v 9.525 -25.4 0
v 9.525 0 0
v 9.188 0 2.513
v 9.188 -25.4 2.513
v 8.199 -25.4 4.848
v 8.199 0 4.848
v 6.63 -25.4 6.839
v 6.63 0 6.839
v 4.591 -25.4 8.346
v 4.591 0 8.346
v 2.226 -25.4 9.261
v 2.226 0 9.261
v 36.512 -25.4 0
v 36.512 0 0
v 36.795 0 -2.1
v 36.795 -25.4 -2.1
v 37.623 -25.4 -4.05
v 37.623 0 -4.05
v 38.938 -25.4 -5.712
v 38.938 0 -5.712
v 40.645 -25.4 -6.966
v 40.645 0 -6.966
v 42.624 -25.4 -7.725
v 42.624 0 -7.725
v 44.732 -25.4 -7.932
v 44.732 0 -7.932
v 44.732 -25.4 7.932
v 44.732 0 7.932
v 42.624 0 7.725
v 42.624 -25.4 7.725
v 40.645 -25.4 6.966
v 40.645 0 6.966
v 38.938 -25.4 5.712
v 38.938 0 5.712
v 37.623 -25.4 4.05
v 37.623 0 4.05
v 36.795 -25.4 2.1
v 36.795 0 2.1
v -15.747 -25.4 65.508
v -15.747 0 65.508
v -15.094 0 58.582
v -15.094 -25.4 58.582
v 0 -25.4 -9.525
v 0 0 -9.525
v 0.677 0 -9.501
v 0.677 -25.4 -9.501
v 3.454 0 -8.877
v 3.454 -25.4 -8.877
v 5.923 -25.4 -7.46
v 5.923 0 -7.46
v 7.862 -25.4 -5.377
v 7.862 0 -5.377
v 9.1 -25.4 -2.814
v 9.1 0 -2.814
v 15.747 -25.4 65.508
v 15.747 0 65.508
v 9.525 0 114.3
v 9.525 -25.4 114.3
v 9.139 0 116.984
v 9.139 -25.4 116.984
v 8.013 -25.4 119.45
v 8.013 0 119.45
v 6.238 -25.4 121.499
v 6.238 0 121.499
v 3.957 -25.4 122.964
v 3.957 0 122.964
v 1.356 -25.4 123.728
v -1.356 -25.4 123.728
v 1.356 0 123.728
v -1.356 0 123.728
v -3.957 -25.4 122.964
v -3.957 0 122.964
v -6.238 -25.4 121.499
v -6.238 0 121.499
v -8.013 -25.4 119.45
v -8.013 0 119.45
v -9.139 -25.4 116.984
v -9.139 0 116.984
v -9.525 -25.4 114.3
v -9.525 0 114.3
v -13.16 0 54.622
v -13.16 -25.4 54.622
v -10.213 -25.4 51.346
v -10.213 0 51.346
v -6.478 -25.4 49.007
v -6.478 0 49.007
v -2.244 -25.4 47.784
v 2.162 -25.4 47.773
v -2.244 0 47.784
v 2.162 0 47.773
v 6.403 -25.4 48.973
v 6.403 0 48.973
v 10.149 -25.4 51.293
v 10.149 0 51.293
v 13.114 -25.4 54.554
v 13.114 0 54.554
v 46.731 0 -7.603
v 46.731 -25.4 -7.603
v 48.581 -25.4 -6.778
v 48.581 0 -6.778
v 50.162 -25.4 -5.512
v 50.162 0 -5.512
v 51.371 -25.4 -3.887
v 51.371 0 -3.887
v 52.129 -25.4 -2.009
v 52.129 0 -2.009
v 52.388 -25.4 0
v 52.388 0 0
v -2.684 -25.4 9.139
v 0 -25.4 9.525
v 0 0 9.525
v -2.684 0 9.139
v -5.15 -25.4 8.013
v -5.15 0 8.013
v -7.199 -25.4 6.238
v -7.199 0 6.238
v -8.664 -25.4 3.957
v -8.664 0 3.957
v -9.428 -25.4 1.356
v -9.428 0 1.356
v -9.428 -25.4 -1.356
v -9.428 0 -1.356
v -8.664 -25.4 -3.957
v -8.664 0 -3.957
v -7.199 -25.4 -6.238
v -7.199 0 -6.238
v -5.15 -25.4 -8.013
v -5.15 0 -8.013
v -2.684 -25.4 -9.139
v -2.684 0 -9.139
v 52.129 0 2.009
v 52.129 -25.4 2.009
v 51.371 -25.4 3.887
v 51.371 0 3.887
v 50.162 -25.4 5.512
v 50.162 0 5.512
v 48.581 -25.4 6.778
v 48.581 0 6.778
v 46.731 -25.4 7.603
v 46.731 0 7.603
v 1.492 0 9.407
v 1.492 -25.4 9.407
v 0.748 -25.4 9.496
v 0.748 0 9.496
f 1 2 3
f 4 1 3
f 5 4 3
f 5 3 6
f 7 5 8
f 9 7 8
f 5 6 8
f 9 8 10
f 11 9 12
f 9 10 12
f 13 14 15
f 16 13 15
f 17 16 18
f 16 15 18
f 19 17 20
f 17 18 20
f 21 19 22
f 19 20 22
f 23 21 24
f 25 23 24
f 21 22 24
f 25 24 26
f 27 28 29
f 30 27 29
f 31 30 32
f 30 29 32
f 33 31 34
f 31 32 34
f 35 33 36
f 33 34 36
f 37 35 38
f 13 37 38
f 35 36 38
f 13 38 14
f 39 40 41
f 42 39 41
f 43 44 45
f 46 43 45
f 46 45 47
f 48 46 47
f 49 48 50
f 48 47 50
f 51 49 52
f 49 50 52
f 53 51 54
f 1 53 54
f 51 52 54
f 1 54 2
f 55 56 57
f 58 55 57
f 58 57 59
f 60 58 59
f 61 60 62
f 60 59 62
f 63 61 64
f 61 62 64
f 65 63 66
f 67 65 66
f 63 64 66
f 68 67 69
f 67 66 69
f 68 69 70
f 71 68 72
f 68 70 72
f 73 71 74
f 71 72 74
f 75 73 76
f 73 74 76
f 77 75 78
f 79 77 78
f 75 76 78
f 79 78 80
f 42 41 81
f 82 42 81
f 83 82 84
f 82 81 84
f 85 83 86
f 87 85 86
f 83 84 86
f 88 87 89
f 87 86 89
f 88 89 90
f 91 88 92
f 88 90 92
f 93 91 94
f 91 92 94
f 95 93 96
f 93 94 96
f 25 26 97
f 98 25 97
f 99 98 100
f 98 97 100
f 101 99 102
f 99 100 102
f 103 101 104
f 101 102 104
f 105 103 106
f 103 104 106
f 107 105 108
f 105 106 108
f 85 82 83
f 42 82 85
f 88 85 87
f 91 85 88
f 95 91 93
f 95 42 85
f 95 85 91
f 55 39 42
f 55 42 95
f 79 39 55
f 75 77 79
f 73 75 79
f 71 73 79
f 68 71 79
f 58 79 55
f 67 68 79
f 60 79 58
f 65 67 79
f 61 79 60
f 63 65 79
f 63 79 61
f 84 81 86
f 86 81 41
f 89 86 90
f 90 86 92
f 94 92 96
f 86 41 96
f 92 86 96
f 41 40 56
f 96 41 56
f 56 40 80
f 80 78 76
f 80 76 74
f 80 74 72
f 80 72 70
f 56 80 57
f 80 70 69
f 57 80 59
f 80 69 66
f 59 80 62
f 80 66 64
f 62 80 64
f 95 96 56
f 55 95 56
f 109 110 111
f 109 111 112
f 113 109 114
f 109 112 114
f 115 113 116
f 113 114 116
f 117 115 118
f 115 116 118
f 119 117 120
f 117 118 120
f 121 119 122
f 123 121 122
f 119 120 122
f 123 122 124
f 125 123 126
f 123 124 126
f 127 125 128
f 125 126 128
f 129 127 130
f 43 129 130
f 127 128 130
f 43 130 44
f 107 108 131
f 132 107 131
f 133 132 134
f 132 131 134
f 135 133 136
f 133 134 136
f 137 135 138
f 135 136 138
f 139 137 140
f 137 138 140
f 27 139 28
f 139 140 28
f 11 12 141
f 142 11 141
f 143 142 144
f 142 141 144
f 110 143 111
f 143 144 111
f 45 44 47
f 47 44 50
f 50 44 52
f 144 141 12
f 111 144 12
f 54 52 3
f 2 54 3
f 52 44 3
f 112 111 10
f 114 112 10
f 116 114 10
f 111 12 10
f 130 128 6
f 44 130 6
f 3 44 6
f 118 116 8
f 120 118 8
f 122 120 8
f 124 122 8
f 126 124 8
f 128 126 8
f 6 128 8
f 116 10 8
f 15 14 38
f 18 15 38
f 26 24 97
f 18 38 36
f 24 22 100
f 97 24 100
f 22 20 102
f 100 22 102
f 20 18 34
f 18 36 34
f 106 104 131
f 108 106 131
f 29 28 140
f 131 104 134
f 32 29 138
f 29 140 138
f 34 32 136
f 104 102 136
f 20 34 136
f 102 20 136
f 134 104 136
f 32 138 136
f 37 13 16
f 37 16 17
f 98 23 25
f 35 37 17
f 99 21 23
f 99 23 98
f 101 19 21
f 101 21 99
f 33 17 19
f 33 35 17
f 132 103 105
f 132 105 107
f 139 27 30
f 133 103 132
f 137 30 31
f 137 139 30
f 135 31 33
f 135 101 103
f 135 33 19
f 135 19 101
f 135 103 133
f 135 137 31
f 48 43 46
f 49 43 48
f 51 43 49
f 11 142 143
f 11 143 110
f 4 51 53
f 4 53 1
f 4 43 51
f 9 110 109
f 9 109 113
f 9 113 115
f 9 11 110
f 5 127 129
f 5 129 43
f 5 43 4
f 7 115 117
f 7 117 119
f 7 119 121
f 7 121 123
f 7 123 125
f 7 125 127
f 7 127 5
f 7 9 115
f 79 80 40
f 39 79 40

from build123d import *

# Parameters (mm, degrees)
F1_DEPTH = 25.4


# Not quite as in the source:
# - a feature names something its author has since deleted; it is built from what else it names


with BuildPart() as f1:
    # F0 (on Front) → F1 (new body)
    with BuildSketch(Plane.XZ):
        with BuildLine():
            ThreePointArc((0, 104.775), (6.7351920908, 107.5648079092), (9.525, 114.3))
            ThreePointArc((9.525, 114.3), (0, 123.825), (-9.525, 114.3))
            ThreePointArc((-9.525, 114.3), (-6.7351920908, 107.5648079092), (0, 104.775))
        make_face()
        with BuildLine():
            Line((15.7474569047, 65.5082893304), (9.525, 114.3))
            ThreePointArc((9.525, 114.3), (6.7351920908, 107.5648079092), (0, 104.775))
            Line((0, 104.775), (0, 79.375))
            ThreePointArc((0, 79.375), (10.4912828548, 75.4142187767), (15.7474569047, 65.5082893304))
        make_face()
        with BuildLine():
            ThreePointArc((0, 104.775), (-6.7351920908, 107.5648079092), (-9.525, 114.3))
            Line((-9.525, 114.3), (-15.7474569047, 65.5082893304))
            ThreePointArc((-15.7474569047, 65.5082893304), (-10.4912828548, 75.4142187767), (0, 79.375))
            Line((0, 79.375), (0, 104.775))
        make_face()
        with BuildLine():
            Line((13.1141006333, 54.5537164375), (15.7474569047, 65.5082893304))
            ThreePointArc((15.7474569047, 65.5082893304), (10.4912828548, 75.4142187767), (0, 79.375))
            ThreePointArc((0, 79.375), (-10.4912828548, 75.4142187767), (-15.7474569047, 65.5082893304))
            Line((-15.7474569047, 65.5082893304), (-15.0940259351, 58.5820729906))
            ThreePointArc((-15.0940259351, 58.5820729906), (-2.2443128525, 47.7844444953), (13.1141006333, 54.5537164375))
        make_face()
    extrude(amount=F1_DEPTH)


with BuildPart() as f1b:
    # F0 (on Front) → F1, piece 2 (new body)
    with BuildSketch(Plane.XZ):
        with BuildLine():
            Line((0, -9.525), (0.6773435479, -9.500885786))
            ThreePointArc((0.6773435479, -9.500885786), (6.9705567315, -6.4912990883), (9.525, 0))
            Line((9.525, 0), (0, 0))
            Line((0, 0), (0, 9.525))
            ThreePointArc((0, 9.525), (-9.525, 0), (0, -9.525))
        make_face()
        with BuildLine():
            Line((0, 0), (9.525, 0))
            ThreePointArc((9.525, 0), (7.4810078517, 5.8957736152), (2.2262815701, 9.2611713822))
            Line((2.2262815701, 9.2611713822), (0, 0))
        make_face()
        with BuildLine():
            ThreePointArc((2.2262815701, 9.2611713822), (1.1209298784, 9.4588128858), (0, 9.525))
            Line((0, 9.525), (0, 0))
            Line((0, 0), (2.2262815701, 9.2611713822))
        make_face()
    extrude(amount=F1_DEPTH)


with BuildPart() as f1c:
    # F0 (on Front) → F1, piece 3 (new body)
    with BuildSketch(Plane.XZ):
        with BuildLine():
            ThreePointArc((52.3875, 0), (50.1616327839, 5.5119104847), (44.7324052746, 7.9324746146))
            ThreePointArc((44.7324052746, 7.9324746146), (38.9380895153, 5.7116327839), (36.5125, 0))
            ThreePointArc((36.5125, 0), (38.9380895153, -5.7116327839), (44.7324052746, -7.9324746146))
            ThreePointArc((44.7324052746, -7.9324746146), (50.1616327839, -5.5119104847), (52.3875, 0))
        make_face()
    extrude(amount=F1_DEPTH)


solid = Compound([f1.part, f1b.part, f1c.part])
